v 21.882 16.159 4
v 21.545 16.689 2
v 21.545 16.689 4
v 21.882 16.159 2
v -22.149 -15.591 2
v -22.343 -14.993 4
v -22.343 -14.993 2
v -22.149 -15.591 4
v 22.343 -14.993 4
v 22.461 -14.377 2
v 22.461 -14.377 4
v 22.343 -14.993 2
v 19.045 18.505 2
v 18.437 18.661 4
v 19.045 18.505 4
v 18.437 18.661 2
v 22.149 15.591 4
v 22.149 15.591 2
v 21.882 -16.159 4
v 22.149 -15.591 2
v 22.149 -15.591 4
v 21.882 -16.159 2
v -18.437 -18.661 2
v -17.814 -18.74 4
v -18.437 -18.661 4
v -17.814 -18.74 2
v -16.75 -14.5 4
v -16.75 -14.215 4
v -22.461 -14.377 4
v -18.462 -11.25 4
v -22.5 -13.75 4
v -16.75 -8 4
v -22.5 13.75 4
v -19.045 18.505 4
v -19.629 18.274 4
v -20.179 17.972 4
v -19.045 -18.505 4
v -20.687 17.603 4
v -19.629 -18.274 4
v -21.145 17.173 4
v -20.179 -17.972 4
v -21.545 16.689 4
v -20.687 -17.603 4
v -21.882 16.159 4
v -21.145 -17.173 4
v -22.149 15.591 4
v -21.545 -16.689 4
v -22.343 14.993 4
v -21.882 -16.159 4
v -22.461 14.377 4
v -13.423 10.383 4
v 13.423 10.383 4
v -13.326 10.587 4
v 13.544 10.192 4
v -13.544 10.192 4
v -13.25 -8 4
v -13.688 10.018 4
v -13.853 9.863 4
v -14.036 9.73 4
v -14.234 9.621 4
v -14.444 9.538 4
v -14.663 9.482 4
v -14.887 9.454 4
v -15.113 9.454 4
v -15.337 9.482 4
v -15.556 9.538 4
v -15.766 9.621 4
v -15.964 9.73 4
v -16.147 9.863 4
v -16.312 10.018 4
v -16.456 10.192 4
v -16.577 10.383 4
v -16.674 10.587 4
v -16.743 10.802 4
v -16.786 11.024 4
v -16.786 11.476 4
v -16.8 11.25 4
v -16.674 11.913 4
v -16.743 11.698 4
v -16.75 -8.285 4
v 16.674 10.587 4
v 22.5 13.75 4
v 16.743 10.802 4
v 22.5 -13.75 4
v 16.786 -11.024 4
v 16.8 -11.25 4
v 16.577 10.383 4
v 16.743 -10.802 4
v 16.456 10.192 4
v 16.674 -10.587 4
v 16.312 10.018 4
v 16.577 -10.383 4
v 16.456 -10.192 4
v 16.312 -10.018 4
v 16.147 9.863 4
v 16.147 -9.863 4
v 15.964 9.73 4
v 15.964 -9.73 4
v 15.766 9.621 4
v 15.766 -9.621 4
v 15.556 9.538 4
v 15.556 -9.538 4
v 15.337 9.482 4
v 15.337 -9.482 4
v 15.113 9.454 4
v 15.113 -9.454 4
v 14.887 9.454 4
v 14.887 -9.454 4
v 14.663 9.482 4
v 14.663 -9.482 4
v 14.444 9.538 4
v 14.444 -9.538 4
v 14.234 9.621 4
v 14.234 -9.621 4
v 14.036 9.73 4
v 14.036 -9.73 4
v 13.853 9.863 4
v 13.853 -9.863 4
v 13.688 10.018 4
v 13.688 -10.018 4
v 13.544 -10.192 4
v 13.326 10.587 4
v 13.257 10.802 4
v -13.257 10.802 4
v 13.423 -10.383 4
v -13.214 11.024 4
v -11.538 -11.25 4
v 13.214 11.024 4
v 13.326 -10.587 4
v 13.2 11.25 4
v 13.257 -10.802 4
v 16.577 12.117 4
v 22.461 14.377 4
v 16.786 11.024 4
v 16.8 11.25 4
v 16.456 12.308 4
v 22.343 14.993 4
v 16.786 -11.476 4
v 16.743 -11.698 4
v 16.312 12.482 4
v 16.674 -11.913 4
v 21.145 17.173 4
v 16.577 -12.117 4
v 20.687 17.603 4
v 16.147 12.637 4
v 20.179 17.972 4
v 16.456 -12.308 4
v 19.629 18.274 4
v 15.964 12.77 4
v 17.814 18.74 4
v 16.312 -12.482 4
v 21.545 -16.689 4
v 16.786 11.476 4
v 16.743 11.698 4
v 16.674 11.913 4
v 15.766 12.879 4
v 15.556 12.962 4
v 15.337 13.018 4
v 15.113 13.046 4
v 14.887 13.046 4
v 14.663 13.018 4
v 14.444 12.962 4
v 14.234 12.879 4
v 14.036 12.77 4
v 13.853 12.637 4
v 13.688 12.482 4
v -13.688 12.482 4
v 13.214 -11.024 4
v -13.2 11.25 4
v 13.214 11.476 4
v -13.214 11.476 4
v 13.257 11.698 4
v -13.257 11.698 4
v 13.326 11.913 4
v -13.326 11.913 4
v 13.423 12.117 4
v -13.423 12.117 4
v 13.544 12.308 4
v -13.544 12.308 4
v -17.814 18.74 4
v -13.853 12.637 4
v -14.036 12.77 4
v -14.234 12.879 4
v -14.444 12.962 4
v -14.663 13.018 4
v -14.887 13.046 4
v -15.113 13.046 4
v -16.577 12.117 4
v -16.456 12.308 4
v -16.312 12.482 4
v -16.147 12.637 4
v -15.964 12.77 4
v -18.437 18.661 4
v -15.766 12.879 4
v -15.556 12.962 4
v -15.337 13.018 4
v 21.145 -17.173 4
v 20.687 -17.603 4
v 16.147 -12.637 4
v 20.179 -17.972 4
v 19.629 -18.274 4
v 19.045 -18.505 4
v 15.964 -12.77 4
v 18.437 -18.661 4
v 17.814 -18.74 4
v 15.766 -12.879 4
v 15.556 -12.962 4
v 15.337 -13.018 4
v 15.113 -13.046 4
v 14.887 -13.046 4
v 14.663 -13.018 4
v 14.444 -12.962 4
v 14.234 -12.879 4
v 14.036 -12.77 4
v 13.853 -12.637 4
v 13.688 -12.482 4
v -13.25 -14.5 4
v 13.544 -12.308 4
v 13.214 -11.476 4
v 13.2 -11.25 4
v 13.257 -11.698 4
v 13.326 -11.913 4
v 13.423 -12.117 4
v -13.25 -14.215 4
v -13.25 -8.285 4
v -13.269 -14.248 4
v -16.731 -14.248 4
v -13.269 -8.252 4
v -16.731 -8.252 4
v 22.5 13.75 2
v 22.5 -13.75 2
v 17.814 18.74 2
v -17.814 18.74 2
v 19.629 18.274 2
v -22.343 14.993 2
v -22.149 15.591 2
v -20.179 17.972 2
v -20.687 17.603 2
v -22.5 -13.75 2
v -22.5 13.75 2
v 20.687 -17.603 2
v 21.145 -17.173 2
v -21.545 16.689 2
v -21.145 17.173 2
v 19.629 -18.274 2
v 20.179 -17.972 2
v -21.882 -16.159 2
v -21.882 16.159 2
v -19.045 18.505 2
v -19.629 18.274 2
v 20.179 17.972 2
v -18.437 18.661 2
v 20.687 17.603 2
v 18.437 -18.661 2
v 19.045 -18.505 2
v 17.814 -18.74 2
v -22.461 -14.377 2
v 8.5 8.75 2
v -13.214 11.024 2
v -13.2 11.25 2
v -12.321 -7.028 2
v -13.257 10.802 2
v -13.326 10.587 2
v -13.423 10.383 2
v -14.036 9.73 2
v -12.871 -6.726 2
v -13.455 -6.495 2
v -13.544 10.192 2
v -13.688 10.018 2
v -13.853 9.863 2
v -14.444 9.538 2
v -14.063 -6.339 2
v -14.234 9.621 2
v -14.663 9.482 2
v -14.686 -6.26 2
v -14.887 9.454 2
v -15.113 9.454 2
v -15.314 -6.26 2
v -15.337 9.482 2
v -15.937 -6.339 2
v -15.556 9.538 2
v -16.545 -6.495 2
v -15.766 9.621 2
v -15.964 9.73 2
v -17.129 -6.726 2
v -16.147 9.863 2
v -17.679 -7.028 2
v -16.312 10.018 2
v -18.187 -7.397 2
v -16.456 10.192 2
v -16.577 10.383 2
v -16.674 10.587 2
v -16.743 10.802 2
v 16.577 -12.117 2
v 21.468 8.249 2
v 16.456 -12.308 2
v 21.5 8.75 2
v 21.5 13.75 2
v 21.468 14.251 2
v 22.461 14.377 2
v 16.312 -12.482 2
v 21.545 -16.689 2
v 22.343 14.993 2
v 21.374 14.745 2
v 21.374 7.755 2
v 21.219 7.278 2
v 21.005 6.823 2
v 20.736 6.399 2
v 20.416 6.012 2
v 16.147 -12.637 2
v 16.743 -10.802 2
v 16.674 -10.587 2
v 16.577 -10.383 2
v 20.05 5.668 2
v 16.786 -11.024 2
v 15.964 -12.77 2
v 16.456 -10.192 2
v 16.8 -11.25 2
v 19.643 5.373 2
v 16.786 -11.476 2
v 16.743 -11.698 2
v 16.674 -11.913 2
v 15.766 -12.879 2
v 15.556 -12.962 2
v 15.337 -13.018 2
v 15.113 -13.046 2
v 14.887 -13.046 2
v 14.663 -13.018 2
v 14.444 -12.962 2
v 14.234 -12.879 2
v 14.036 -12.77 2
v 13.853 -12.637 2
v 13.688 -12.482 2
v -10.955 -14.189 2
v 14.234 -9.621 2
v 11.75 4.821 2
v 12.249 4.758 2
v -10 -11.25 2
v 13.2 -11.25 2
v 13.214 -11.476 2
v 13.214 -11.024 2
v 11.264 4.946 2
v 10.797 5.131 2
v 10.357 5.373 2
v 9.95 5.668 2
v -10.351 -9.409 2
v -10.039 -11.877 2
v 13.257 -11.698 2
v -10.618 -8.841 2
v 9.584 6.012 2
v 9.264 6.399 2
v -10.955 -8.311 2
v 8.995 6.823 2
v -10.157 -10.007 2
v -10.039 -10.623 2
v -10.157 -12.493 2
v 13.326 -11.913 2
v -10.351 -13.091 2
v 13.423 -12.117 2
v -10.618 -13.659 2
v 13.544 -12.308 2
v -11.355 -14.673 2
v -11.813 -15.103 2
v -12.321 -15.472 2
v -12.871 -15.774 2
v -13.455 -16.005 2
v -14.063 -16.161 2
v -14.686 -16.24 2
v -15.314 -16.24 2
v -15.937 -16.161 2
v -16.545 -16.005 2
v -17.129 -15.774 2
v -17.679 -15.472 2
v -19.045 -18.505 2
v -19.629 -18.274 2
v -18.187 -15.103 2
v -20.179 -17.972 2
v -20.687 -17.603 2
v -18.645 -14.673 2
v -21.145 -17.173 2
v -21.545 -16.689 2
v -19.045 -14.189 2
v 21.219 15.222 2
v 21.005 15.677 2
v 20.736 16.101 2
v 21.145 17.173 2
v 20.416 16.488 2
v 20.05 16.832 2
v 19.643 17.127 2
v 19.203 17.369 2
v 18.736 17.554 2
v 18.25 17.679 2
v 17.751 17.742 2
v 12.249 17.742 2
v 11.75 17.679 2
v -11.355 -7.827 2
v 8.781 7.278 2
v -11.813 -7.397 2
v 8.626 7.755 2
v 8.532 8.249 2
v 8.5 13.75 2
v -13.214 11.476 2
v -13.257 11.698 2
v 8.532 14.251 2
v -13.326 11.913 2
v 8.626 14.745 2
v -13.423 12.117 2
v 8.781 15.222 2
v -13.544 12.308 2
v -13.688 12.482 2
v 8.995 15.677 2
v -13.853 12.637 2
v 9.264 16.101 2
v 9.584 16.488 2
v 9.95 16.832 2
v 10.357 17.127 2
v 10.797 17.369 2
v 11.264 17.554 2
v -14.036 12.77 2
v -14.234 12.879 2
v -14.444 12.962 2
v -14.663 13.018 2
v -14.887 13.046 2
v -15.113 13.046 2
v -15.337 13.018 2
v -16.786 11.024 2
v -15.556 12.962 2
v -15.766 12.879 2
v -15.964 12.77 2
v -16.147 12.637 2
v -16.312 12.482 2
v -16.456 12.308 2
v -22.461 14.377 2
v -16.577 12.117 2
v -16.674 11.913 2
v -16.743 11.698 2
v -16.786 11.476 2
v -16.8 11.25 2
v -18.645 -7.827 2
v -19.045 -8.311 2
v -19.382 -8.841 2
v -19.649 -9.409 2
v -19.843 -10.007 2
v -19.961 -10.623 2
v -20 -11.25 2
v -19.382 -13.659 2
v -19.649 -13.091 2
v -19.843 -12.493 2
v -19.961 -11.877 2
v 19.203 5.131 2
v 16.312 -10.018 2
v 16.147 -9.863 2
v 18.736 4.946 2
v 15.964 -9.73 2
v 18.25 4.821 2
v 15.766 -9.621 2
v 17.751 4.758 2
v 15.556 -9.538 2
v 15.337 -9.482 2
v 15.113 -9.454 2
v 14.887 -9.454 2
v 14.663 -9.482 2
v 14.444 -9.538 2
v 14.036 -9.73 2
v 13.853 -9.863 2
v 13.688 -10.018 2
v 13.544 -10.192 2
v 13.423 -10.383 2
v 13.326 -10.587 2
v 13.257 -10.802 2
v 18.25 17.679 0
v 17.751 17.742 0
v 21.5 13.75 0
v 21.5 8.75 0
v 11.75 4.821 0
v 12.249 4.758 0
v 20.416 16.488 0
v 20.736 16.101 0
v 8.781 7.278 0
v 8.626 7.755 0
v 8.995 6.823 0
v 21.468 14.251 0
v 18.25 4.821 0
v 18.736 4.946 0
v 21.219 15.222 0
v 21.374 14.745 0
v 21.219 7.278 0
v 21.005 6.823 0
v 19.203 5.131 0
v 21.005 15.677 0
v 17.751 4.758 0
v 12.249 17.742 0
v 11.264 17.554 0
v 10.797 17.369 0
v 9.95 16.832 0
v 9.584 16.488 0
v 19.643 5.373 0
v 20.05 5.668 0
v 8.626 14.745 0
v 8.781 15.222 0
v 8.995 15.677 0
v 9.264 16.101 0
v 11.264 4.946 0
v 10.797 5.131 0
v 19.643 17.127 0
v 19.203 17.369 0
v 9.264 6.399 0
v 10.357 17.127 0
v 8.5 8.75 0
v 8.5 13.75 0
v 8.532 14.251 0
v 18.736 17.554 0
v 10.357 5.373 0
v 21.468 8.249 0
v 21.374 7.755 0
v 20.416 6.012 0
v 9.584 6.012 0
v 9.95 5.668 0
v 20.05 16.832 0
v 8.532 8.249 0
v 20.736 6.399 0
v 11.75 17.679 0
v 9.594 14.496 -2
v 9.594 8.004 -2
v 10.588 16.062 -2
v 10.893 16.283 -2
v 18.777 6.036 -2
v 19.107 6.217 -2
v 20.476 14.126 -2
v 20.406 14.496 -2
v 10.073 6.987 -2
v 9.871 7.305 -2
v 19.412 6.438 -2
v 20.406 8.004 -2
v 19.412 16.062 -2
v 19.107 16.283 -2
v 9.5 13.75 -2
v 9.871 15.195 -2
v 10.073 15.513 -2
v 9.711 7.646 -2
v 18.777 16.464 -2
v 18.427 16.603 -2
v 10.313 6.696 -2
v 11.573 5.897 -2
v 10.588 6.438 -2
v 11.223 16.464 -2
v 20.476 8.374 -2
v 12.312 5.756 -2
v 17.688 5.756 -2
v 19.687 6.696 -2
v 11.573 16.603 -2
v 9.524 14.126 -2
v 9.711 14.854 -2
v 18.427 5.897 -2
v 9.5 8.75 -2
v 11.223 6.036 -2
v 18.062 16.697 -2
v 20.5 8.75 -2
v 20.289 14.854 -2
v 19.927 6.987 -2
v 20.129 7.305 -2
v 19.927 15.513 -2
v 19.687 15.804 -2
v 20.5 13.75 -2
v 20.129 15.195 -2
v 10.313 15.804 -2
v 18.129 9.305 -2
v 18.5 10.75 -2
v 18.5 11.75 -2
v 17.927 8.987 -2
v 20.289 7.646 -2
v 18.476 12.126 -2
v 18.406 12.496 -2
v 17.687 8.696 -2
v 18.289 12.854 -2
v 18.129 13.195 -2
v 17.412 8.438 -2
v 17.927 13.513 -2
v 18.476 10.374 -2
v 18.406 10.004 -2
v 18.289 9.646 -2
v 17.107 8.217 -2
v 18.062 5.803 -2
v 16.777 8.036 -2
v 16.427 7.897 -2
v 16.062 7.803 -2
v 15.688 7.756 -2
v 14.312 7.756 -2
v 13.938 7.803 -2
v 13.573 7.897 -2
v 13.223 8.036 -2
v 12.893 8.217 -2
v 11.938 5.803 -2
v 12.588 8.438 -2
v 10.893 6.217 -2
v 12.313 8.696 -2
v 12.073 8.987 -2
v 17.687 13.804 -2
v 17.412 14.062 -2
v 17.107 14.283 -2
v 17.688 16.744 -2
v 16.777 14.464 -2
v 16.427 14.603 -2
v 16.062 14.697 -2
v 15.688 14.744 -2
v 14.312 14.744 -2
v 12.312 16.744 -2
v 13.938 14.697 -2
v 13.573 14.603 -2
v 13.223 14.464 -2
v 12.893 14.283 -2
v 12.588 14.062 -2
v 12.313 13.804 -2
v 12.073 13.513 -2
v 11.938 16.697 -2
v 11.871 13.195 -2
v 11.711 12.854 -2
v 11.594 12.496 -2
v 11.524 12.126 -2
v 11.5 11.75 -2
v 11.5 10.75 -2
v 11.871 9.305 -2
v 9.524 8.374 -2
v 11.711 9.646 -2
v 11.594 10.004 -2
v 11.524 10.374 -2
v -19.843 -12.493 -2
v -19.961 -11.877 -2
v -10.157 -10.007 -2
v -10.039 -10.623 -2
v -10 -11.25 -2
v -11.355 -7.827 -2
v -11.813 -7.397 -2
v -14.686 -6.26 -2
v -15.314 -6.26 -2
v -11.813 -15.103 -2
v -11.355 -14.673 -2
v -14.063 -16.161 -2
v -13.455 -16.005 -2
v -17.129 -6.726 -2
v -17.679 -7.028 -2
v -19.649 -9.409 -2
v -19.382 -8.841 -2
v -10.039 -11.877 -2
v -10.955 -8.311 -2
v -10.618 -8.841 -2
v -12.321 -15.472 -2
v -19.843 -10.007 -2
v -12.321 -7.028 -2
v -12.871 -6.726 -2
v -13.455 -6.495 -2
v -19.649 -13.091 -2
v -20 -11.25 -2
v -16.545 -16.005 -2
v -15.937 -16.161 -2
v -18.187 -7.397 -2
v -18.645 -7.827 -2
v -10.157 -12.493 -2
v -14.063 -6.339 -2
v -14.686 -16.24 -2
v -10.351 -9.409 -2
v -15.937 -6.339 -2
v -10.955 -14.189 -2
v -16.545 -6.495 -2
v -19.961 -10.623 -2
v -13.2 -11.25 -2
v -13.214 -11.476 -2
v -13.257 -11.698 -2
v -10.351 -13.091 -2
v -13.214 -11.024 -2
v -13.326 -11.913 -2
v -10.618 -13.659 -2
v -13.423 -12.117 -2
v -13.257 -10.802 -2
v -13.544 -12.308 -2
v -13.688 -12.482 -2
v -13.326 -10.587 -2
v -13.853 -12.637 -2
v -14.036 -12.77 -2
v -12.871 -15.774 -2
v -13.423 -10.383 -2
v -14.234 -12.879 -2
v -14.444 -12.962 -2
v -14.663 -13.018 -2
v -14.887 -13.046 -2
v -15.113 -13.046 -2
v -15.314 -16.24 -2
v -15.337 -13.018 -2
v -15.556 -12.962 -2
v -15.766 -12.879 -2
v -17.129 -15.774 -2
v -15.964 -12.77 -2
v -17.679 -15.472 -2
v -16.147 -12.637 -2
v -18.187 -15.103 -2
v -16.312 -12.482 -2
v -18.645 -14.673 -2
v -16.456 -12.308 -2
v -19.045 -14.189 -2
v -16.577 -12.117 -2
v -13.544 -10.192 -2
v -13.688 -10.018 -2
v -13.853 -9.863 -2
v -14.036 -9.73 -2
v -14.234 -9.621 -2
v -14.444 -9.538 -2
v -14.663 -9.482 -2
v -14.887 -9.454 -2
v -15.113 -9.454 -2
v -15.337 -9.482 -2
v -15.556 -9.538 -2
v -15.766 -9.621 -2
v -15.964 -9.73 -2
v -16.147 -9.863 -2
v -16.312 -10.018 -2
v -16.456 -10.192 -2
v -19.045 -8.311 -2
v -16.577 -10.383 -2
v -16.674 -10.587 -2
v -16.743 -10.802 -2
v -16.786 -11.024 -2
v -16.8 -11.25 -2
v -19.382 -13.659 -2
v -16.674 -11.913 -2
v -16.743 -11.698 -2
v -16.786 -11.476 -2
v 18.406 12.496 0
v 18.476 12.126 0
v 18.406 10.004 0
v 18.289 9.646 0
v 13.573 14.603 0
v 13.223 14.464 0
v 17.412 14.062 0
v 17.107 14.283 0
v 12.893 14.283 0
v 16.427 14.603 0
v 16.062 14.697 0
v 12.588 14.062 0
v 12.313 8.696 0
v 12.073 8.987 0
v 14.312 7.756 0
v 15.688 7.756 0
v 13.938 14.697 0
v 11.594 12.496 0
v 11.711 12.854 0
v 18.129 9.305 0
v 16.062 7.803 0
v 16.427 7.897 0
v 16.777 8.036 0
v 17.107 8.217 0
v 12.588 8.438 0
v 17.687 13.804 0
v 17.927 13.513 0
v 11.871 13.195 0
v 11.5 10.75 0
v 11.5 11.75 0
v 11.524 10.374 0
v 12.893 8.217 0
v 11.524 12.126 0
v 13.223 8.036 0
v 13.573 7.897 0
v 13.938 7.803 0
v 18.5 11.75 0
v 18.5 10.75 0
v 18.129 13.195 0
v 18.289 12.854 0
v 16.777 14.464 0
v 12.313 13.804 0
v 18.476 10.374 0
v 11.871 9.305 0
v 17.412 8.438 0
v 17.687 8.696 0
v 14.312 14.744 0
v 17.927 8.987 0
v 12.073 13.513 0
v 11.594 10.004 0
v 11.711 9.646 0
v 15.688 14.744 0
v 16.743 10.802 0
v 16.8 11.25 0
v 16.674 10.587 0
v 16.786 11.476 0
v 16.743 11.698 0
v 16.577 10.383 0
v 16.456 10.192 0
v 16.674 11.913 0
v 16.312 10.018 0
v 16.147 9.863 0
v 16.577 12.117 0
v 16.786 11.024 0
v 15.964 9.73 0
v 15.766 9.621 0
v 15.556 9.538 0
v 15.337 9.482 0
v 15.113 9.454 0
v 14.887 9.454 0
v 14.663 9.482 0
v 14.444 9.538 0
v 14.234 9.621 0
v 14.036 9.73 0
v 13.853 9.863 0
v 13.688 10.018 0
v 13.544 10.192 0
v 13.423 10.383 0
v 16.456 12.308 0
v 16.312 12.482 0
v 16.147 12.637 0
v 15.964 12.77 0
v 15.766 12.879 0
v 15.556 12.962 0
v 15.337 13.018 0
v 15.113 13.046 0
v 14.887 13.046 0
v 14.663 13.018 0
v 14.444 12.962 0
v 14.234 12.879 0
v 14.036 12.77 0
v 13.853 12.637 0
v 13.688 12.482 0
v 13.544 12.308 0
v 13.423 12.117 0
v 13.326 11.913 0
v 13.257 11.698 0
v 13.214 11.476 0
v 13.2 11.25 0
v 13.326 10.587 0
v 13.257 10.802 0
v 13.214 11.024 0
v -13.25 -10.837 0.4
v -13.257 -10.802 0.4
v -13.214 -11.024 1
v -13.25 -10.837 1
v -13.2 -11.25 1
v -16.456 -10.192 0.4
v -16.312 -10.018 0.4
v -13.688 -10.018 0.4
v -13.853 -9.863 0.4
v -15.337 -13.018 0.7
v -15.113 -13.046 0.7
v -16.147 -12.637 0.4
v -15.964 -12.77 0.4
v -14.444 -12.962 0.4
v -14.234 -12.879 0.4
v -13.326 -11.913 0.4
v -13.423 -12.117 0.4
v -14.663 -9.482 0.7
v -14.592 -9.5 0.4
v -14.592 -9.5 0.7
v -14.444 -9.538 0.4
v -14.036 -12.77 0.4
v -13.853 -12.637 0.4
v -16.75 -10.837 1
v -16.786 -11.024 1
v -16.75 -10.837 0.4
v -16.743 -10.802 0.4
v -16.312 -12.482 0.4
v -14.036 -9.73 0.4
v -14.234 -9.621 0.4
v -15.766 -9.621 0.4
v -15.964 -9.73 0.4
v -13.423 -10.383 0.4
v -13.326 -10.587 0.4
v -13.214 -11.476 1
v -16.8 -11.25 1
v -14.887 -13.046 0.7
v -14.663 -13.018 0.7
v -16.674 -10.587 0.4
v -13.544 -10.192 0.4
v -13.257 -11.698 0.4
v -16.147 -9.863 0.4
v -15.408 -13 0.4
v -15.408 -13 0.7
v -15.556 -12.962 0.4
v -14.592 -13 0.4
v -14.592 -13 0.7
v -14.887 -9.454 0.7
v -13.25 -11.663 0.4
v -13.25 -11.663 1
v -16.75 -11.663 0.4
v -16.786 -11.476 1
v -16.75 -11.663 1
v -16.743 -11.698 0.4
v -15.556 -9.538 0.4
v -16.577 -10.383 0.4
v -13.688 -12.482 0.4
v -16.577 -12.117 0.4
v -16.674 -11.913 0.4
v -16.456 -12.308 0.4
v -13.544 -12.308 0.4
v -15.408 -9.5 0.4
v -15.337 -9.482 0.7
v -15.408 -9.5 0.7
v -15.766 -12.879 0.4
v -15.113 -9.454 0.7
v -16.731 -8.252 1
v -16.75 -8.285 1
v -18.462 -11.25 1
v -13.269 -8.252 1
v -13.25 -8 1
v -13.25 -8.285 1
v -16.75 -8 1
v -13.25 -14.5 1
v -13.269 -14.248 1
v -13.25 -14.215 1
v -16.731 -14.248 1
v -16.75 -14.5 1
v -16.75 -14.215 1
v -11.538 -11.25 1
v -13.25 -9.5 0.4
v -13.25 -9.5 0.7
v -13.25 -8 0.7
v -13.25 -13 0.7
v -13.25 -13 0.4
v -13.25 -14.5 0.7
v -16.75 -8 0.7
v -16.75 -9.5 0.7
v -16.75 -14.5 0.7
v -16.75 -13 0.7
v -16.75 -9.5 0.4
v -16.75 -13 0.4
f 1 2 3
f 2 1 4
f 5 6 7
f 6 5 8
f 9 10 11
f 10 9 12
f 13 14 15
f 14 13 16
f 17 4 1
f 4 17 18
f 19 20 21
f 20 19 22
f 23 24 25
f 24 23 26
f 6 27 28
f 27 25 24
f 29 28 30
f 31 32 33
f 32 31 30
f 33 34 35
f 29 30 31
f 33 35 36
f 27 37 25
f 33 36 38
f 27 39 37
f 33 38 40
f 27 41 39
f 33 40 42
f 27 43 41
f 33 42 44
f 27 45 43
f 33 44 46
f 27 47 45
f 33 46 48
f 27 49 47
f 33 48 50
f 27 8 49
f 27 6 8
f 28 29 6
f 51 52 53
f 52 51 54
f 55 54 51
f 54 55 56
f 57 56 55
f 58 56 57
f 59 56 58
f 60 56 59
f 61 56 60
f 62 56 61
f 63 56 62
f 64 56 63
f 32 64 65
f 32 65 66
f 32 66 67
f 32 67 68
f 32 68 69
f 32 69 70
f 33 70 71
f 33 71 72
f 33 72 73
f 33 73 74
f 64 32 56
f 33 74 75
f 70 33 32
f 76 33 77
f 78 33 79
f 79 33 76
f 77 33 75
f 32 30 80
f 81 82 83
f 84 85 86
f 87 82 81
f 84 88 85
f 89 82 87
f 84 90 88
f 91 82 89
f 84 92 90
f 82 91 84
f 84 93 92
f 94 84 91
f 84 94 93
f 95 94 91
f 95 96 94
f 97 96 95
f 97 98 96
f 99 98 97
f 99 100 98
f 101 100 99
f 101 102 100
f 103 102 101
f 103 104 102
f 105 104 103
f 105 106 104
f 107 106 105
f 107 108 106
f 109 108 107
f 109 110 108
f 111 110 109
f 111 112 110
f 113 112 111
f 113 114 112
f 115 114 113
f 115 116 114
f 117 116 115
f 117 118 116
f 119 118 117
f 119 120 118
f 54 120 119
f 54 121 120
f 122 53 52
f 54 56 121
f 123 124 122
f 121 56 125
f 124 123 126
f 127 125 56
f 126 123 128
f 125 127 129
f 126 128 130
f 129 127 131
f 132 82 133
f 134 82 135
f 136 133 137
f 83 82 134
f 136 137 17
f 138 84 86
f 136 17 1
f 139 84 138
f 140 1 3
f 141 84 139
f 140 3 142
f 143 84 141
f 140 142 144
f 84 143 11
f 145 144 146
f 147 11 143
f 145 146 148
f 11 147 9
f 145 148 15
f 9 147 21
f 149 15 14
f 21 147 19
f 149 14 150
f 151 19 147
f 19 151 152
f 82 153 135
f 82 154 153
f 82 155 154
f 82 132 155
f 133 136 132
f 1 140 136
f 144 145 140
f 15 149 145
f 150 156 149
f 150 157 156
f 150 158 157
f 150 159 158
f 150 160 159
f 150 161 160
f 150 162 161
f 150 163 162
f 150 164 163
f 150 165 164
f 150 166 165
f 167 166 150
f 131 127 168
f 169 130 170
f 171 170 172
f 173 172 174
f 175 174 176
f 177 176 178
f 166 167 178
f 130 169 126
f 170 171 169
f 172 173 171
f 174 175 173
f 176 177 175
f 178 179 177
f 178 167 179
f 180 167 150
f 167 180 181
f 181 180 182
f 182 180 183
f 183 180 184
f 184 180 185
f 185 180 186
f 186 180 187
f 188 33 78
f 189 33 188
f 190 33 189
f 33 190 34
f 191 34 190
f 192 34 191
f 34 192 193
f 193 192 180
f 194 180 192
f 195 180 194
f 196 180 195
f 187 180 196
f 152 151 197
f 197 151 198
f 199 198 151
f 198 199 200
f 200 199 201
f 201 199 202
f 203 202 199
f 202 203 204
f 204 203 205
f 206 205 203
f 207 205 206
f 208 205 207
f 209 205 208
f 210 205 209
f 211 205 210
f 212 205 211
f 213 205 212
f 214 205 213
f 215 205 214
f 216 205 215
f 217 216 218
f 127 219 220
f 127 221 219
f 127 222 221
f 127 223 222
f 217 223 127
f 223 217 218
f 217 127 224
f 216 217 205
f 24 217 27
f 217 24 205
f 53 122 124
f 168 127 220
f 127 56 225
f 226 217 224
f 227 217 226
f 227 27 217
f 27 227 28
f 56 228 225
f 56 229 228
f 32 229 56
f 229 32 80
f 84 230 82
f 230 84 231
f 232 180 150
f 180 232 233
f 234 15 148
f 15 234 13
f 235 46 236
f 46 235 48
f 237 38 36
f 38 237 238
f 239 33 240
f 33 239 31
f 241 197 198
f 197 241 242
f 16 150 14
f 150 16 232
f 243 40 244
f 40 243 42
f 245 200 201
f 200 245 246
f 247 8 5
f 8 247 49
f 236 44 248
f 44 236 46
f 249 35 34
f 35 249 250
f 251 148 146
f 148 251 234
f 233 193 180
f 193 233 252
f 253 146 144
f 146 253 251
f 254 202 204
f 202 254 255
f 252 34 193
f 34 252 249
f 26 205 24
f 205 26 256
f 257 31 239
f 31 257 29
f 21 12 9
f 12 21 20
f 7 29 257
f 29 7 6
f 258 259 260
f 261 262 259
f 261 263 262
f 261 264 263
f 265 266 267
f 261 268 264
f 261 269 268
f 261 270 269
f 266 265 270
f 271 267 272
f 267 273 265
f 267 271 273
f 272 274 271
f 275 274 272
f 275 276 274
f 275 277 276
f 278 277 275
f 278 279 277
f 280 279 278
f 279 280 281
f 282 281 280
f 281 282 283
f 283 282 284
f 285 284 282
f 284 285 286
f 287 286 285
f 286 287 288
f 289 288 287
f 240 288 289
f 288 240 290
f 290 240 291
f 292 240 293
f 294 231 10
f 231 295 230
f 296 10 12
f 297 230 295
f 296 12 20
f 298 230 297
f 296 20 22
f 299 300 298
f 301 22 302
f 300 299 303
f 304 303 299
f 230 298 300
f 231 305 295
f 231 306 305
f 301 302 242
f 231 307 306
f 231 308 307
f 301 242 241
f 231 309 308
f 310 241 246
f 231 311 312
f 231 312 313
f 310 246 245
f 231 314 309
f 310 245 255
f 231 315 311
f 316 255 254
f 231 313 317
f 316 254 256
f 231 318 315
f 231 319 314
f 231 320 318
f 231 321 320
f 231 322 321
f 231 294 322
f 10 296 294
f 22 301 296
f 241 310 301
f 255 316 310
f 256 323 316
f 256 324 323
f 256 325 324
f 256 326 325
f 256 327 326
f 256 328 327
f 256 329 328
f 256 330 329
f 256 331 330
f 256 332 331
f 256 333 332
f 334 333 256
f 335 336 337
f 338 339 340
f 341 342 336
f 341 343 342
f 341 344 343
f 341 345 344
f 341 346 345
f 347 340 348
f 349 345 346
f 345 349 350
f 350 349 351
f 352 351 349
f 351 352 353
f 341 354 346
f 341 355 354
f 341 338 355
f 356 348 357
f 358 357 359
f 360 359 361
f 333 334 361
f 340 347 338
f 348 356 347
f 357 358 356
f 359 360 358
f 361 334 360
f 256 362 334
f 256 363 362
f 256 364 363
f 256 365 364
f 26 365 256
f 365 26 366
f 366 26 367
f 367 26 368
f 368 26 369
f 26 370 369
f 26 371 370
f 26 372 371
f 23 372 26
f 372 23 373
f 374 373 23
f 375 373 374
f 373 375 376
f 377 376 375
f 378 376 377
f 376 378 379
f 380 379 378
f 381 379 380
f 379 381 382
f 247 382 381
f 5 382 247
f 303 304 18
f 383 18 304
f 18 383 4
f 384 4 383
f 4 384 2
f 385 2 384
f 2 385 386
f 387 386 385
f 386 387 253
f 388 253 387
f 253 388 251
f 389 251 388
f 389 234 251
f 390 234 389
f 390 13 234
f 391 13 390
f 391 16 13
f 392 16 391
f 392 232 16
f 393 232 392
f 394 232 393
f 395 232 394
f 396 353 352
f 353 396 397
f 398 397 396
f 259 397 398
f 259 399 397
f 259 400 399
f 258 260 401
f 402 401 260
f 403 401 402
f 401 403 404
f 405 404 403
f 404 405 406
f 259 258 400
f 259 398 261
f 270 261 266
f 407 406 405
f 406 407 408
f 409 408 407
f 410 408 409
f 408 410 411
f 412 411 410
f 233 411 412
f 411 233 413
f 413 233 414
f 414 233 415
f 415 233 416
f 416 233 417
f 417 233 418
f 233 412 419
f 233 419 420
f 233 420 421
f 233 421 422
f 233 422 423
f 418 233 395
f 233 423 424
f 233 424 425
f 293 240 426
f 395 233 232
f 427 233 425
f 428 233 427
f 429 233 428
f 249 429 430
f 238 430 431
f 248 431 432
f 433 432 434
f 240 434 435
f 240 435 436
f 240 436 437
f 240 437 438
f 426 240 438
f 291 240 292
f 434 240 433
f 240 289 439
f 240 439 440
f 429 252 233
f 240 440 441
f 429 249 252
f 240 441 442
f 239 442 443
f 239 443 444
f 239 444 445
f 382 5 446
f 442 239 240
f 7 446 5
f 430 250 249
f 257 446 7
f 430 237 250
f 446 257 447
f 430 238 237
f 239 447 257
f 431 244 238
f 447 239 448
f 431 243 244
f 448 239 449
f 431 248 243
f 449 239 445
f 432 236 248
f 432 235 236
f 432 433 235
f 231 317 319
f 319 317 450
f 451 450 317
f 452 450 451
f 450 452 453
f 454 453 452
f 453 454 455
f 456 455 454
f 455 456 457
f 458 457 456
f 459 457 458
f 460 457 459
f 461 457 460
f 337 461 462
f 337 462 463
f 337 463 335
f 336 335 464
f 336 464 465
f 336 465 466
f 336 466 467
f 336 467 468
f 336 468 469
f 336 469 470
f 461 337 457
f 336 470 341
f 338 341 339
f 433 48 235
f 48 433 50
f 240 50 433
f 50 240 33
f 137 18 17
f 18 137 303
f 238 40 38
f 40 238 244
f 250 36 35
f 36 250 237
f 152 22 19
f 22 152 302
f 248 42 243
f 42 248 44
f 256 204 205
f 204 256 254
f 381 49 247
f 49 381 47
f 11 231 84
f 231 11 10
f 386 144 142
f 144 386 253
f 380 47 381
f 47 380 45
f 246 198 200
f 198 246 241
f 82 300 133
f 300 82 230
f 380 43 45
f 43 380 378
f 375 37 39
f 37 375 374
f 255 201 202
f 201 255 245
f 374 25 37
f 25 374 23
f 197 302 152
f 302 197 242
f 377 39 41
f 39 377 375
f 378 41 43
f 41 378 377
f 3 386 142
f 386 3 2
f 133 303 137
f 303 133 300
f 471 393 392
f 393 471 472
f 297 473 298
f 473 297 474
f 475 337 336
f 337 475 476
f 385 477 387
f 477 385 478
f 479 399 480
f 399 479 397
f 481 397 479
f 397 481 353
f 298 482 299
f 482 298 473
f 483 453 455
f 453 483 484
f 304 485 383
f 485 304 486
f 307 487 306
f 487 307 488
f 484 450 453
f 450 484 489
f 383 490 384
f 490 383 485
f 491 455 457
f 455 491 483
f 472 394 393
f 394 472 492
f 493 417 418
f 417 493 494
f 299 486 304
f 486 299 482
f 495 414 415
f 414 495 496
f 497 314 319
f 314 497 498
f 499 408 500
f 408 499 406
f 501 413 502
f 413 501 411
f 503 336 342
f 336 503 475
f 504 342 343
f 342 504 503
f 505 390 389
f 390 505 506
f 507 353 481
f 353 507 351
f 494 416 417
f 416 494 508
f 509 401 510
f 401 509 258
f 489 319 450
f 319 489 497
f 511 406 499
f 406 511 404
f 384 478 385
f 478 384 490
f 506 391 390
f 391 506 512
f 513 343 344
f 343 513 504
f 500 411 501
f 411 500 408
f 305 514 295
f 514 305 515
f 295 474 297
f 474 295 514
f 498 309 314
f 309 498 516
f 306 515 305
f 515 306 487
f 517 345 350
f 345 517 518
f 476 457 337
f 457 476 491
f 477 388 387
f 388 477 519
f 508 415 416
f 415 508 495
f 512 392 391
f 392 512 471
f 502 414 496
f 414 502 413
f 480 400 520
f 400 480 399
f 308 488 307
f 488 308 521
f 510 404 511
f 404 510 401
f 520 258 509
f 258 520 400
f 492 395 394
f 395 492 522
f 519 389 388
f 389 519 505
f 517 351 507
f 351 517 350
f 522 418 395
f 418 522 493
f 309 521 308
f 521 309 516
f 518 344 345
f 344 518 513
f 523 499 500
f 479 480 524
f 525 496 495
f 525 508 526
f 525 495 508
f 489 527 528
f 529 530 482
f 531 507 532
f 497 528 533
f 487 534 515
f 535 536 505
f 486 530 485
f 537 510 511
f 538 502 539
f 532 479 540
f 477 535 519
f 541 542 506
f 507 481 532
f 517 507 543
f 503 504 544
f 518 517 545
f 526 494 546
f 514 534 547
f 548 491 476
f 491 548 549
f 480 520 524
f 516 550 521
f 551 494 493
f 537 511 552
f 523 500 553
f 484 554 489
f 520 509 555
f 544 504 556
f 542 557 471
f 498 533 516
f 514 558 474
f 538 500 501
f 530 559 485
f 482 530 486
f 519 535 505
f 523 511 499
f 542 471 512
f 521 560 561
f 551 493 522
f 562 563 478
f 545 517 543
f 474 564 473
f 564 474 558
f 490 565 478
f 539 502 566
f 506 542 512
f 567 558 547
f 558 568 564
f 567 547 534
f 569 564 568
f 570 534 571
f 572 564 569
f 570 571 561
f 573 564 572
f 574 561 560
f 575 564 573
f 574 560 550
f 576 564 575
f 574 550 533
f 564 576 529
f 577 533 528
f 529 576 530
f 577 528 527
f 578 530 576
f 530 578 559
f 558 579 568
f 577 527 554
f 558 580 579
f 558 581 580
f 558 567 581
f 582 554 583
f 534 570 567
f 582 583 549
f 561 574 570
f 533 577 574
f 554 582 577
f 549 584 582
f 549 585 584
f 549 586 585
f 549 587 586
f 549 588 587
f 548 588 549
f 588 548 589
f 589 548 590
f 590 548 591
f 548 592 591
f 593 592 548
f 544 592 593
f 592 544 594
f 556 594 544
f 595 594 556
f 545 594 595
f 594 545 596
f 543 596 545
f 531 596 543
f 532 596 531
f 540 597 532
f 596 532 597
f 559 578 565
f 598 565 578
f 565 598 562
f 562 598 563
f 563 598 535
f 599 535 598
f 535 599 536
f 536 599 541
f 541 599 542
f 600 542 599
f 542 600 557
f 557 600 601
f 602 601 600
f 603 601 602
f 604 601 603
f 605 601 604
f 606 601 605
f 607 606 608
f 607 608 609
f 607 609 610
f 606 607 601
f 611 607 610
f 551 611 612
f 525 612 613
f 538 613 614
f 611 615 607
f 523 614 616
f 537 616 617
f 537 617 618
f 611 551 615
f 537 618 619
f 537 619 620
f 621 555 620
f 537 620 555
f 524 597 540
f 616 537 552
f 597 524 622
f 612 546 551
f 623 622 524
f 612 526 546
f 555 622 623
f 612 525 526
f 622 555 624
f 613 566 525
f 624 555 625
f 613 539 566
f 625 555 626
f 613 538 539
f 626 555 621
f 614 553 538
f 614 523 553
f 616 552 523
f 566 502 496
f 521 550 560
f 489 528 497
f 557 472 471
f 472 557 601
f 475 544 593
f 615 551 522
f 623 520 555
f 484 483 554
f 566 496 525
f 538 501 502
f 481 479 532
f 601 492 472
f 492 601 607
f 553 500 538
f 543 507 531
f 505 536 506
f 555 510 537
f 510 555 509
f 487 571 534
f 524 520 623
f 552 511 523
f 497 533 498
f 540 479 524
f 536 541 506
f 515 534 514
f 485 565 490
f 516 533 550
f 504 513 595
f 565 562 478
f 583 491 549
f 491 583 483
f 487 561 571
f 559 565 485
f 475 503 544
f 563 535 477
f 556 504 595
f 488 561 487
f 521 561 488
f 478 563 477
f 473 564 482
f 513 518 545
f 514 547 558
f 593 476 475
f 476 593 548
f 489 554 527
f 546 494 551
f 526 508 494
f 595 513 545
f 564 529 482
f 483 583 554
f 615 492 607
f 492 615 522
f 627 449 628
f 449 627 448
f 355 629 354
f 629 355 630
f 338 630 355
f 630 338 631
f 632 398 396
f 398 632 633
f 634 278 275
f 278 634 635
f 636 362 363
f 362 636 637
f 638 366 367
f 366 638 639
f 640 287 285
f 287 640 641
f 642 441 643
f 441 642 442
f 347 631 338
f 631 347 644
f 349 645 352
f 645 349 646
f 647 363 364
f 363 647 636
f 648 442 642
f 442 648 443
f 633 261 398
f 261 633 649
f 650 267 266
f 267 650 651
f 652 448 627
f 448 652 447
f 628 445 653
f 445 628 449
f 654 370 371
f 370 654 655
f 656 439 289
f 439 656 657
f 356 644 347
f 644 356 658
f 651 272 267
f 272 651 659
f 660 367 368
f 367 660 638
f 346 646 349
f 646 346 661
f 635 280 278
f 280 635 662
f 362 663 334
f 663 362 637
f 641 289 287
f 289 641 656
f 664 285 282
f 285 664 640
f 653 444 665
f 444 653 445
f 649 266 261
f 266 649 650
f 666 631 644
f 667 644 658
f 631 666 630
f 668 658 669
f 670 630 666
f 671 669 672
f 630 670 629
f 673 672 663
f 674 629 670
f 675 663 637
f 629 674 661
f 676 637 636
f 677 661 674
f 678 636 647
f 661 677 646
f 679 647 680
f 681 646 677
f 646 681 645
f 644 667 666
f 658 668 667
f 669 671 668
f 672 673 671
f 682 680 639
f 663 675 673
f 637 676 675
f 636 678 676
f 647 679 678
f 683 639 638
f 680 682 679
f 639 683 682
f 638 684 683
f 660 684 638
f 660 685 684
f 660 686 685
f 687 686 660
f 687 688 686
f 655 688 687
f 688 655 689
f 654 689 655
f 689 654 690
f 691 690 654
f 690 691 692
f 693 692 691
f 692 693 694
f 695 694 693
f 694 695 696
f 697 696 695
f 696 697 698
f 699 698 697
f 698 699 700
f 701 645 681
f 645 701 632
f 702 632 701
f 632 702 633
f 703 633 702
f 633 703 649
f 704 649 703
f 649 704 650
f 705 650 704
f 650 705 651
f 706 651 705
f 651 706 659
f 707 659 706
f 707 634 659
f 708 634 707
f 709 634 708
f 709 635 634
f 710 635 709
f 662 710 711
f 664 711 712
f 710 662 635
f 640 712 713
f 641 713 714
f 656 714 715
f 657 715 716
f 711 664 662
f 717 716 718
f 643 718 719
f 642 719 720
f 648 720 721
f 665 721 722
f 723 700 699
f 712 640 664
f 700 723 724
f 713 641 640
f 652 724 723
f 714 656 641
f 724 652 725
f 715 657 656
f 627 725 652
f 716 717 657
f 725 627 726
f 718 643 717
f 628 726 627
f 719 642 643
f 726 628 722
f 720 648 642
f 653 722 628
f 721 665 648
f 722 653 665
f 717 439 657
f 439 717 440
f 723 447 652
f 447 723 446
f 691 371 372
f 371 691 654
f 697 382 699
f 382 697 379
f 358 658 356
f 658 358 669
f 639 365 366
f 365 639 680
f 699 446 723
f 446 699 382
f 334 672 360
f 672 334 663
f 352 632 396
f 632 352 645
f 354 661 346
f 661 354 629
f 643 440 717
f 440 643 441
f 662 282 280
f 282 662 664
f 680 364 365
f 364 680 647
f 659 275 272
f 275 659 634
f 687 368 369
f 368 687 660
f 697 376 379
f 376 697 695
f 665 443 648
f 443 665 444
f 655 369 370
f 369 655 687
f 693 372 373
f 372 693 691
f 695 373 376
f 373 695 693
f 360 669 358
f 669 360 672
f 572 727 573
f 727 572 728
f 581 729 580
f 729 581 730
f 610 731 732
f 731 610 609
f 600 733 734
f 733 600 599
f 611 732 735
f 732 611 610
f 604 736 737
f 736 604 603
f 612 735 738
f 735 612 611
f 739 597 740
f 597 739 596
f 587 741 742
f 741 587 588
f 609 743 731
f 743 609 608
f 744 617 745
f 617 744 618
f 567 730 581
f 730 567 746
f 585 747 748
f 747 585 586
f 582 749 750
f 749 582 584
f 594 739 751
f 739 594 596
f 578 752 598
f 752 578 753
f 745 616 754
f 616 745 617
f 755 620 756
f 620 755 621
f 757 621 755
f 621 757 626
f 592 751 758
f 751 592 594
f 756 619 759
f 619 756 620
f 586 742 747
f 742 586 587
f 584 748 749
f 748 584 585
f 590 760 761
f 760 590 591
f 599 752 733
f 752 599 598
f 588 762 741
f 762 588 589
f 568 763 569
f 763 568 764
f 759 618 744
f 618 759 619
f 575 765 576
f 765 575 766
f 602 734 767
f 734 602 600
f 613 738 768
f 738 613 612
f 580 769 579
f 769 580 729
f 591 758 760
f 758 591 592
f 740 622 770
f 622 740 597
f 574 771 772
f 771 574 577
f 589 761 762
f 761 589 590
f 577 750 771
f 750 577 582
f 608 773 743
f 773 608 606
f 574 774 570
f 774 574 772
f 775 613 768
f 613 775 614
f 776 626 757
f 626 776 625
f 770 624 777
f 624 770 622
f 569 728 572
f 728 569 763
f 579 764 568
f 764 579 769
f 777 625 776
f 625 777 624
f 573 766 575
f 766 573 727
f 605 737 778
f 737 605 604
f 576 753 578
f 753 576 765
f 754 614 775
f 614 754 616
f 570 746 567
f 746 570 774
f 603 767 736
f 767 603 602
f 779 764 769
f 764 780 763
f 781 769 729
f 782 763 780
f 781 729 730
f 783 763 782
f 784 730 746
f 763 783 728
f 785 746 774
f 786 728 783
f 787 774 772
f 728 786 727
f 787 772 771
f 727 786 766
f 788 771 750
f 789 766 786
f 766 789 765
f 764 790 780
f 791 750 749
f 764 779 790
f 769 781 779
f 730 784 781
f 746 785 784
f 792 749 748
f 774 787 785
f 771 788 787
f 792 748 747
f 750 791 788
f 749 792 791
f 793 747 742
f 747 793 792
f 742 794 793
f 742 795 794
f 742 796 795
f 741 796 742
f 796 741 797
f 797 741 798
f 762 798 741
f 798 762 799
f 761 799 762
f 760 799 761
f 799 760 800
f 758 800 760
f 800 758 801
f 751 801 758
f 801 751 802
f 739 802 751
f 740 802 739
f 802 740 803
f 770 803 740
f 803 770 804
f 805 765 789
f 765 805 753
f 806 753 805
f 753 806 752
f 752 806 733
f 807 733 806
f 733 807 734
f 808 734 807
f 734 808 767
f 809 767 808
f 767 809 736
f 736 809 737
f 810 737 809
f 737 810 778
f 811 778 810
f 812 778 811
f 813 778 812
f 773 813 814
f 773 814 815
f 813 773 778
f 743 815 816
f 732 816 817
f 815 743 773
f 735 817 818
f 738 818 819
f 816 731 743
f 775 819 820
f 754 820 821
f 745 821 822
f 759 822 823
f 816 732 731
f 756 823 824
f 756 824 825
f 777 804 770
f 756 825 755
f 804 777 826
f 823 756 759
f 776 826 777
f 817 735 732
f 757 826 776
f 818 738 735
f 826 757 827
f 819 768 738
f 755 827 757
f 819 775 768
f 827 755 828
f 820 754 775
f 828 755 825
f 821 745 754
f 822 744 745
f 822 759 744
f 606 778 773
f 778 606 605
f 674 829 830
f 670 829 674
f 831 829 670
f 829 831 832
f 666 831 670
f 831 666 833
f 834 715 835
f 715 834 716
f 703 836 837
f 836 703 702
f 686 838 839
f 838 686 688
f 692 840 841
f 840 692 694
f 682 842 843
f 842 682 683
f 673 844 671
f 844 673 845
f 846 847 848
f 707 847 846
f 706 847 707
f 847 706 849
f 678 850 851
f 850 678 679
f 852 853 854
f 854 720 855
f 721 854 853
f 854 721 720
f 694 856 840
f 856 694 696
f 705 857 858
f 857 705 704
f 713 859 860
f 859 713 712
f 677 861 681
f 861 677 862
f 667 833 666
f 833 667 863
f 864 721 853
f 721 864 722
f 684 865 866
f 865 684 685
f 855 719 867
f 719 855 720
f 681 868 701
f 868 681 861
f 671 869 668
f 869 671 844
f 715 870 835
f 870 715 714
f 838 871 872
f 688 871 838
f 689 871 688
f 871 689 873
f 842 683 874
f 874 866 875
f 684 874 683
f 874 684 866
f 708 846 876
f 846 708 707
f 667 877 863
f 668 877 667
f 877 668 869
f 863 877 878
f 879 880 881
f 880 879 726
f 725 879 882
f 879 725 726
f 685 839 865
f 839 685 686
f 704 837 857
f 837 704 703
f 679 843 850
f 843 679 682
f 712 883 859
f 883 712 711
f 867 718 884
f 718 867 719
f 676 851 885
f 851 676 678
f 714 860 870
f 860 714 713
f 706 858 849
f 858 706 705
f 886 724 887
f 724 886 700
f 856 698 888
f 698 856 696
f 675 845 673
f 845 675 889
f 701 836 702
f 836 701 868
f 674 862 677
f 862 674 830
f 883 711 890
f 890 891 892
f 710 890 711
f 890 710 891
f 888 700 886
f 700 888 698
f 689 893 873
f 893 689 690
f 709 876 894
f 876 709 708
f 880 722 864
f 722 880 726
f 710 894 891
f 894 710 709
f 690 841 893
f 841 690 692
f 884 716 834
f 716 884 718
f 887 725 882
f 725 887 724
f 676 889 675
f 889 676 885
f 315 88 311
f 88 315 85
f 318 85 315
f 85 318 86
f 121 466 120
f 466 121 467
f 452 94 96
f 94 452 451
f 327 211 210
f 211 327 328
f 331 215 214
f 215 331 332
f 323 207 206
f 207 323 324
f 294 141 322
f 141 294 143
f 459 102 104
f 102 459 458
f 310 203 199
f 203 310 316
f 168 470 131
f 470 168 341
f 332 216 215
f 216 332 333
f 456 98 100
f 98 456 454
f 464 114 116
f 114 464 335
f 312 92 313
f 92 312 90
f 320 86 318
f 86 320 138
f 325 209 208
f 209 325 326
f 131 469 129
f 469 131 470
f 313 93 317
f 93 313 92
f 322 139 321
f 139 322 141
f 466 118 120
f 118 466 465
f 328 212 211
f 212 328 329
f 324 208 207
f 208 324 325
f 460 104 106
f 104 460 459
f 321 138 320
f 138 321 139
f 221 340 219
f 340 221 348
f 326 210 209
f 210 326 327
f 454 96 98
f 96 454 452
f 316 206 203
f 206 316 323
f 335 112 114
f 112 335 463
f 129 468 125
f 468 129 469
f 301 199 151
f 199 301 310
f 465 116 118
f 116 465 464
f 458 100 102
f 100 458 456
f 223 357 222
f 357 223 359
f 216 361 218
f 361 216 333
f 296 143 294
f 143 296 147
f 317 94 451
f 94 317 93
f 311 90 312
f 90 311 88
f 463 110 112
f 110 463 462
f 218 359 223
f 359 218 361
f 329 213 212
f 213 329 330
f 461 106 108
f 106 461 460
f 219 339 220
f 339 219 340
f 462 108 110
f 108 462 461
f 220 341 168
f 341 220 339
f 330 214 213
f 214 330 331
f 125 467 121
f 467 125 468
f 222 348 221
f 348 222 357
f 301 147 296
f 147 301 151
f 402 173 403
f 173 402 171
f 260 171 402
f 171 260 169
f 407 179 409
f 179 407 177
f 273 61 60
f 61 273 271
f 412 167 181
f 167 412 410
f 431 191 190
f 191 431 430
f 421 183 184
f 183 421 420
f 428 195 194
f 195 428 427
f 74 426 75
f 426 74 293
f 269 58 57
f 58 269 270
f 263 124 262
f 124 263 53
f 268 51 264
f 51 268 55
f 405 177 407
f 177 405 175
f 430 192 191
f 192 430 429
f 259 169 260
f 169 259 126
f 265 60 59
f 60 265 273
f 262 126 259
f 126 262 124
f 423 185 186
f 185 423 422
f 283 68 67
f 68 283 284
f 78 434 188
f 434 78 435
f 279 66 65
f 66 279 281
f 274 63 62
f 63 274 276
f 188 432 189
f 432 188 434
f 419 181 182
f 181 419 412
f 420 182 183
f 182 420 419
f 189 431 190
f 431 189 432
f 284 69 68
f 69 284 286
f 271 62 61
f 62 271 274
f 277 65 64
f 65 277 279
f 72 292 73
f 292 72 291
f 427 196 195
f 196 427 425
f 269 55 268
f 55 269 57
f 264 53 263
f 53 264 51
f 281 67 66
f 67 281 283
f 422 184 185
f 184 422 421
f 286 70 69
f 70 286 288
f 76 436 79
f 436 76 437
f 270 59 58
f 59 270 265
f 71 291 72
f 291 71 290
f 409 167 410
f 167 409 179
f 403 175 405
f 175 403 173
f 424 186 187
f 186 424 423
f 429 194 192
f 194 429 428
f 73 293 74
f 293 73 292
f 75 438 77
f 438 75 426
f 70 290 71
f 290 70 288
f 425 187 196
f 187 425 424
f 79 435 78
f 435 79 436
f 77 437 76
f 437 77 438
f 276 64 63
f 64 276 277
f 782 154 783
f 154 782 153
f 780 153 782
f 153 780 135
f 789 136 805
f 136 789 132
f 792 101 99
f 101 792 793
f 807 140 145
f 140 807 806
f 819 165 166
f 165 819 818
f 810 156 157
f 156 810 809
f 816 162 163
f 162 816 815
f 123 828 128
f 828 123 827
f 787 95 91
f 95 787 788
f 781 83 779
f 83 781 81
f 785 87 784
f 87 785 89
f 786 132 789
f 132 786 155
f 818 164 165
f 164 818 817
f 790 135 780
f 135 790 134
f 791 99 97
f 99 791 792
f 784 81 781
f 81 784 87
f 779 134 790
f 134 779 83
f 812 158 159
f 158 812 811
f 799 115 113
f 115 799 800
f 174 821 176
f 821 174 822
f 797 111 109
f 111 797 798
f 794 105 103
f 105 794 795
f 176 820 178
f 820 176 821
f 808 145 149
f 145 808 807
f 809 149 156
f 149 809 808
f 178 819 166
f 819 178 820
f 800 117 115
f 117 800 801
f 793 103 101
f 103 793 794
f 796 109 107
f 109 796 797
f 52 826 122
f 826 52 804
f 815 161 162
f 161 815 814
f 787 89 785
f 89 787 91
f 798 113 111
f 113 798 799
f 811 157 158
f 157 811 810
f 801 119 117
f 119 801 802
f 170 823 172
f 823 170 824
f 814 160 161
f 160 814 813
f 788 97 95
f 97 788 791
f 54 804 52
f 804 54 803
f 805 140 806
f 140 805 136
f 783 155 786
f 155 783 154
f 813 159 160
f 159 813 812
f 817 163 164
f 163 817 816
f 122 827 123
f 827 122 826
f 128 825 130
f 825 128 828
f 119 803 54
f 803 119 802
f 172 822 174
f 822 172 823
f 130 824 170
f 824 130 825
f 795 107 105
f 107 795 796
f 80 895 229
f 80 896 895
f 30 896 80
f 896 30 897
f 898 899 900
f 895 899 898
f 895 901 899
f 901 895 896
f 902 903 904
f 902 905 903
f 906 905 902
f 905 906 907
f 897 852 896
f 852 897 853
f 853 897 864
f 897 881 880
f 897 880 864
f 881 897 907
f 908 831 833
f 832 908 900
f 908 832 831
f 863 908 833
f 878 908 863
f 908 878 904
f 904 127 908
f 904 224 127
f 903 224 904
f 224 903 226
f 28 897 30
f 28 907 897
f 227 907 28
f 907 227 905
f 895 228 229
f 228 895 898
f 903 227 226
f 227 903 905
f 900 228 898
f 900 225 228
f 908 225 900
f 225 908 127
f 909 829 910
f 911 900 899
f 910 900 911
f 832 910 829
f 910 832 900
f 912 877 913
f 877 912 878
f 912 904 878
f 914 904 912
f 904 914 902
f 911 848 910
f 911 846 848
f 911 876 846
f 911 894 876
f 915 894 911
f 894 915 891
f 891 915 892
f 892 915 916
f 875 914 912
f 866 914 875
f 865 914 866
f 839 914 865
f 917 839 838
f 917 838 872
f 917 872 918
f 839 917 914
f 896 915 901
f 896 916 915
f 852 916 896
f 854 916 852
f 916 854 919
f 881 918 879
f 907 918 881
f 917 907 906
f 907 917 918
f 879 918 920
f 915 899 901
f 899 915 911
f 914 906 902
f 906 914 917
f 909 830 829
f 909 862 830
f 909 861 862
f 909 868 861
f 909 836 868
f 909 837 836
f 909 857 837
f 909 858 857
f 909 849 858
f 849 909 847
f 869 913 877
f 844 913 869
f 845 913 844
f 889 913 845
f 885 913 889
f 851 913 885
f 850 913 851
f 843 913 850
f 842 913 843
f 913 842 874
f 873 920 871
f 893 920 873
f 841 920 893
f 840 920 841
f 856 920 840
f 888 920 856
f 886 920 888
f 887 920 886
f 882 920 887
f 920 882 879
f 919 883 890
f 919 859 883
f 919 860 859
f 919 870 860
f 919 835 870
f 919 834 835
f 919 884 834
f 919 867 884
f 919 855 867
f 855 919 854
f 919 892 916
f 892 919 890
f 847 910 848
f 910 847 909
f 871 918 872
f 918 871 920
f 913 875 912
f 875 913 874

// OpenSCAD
$fn = 50;


difference() {
	union() {
		translate(v = [0, 0, 2]) {
			rotate(a = [0, 0, 0]) {
				hull() {
					translate(v = [-17.5000000000, 13.7500000000, 0]) {
						rotate(a = [0, 0, 0]) {
							translate(v = [0, 0, 0]) {
								rotate(a = [0, 0, 0]) {
									cylinder(h = 2, r = 5);
								}
							}
						}
					}
					translate(v = [17.5000000000, 13.7500000000, 0]) {
						rotate(a = [0, 0, 0]) {
							translate(v = [0, 0, 0]) {
								rotate(a = [0, 0, 0]) {
									cylinder(h = 2, r = 5);
								}
							}
						}
					}
					translate(v = [-17.5000000000, -13.7500000000, 0]) {
						rotate(a = [0, 0, 0]) {
							translate(v = [0, 0, 0]) {
								rotate(a = [0, 0, 0]) {
									cylinder(h = 2, r = 5);
								}
							}
						}
					}
					translate(v = [17.5000000000, -13.7500000000, 0]) {
						rotate(a = [0, 0, 0]) {
							translate(v = [0, 0, 0]) {
								rotate(a = [0, 0, 0]) {
									cylinder(h = 2, r = 5);
								}
							}
						}
					}
				}
			}
		}
		translate(v = [15.0000000000, 11.2500000000, 0]) {
			rotate(a = [0, 0, 0]) {
				hull() {
					translate(v = [-2.5000000000, 2.5000000000, 0]) {
						rotate(a = [0, 0, 0]) {
							cylinder(h = 2, r1 = 4.0000000000, r2 = 4.0000000000);
						}
					}
					translate(v = [2.5000000000, 2.5000000000, 0]) {
						rotate(a = [0, 0, 0]) {
							cylinder(h = 2, r1 = 4.0000000000, r2 = 4.0000000000);
						}
					}
					translate(v = [-2.5000000000, -2.5000000000, 0]) {
						rotate(a = [0, 0, 0]) {
							cylinder(h = 2, r1 = 4.0000000000, r2 = 4.0000000000);
						}
					}
					translate(v = [2.5000000000, -2.5000000000, 0]) {
						rotate(a = [0, 0, 0]) {
							cylinder(h = 2, r1 = 4.0000000000, r2 = 4.0000000000);
						}
					}
				}
			}
		}
		translate(v = [15.0000000000, 11.2500000000, -2]) {
			rotate(a = [0, 180, 0]) {
				hull() {
					translate(v = [-2.5000000000, 2.5000000000, 0]) {
						rotate(a = [0, 180, 0]) {
							cylinder(h = 2, r1 = 3.0000000000, r2 = 4.0000000000);
						}
					}
					translate(v = [2.5000000000, 2.5000000000, 0]) {
						rotate(a = [0, 180, 0]) {
							cylinder(h = 2, r1 = 3.0000000000, r2 = 4.0000000000);
						}
					}
					translate(v = [-2.5000000000, -2.5000000000, 0]) {
						rotate(a = [0, 180, 0]) {
							cylinder(h = 2, r1 = 3.0000000000, r2 = 4.0000000000);
						}
					}
					translate(v = [2.5000000000, -2.5000000000, 0]) {
						rotate(a = [0, 180, 0]) {
							cylinder(h = 2, r1 = 3.0000000000, r2 = 4.0000000000);
						}
					}
				}
			}
		}
		translate(v = [-15.0000000000, -11.2500000000, -2.0000000000]) {
			rotate(a = [0, 0, 0]) {
				cylinder(h = 4, r = 5);
			}
		}
	}
	union() {
		translate(v = [15.0000000000, 11.2500000000, -2]) {
			rotate(a = [0, 0, 0]) {
				hull() {
					translate(v = [-0.5000000000, 0.5000000000, 0]) {
						rotate(a = [0, 0, 0]) {
							translate(v = [0, 0, 0]) {
								rotate(a = [0, 0, 0]) {
									cylinder(h = 2, r = 3.0000000000);
								}
							}
						}
					}
					translate(v = [0.5000000000, 0.5000000000, 0]) {
						rotate(a = [0, 0, 0]) {
							translate(v = [0, 0, 0]) {
								rotate(a = [0, 0, 0]) {
									cylinder(h = 2, r = 3.0000000000);
								}
							}
						}
					}
					translate(v = [-0.5000000000, -0.5000000000, 0]) {
						rotate(a = [0, 0, 0]) {
							translate(v = [0, 0, 0]) {
								rotate(a = [0, 0, 0]) {
									cylinder(h = 2, r = 3.0000000000);
								}
							}
						}
					}
					translate(v = [0.5000000000, -0.5000000000, 0]) {
						rotate(a = [0, 0, 0]) {
							translate(v = [0, 0, 0]) {
								rotate(a = [0, 0, 0]) {
									cylinder(h = 2, r = 3.0000000000);
								}
							}
						}
					}
				}
			}
		}
		translate(v = [-15.0000000000, -11.2500000000, -50]) {
			rotate(a = [0, 0, 0]) {
				cylinder(h = 100, r = 1.8000000000);
			}
		}
		translate(v = [15.0000000000, -11.2500000000, -50]) {
			rotate(a = [0, 0, 0]) {
				cylinder(h = 100, r = 1.8000000000);
			}
		}
		translate(v = [-15.0000000000, 11.2500000000, -50]) {
			rotate(a = [0, 0, 0]) {
				cylinder(h = 100, r = 1.8000000000);
			}
		}
		translate(v = [15.0000000000, 11.2500000000, -50]) {
			rotate(a = [0, 0, 0]) {
				cylinder(h = 100, r = 1.8000000000);
			}
		}
		translate(v = [-15.0000000000, -11.2500000000, 1]) {
			rotate(a = [0, 0, 0]) {
				#translate(v = [0, 0, 0]) {
					rotate(a = [0, 0, 0]) {
						linear_extrude(height = 3) {
							polygon(points = [[3.4620000000, 0.0000000000], [1.7310000000, 2.9981799479], [-1.7310000000, 2.9981799479], [-3.4620000000, 0.0000000000], [-1.7310000000, -2.9981799479], [1.7310000000, -2.9981799479]]);
						}
					}
				}
			}
		}
		#translate(v = [-16.7500000000, -14.5000000000, 4]) {
			rotate(a = [0, 0, 0]) {
				cube(size = [3.5000000000, 6.5000000000, 0.3000000000]);
			}
		}
		#translate(v = [-16.7500000000, -13.0000000000, 4.3000000000]) {
			rotate(a = [0, 0, 0]) {
				cube(size = [3.5000000000, 3.5000000000, 0.3000000000]);
			}
		}
		#translate(v = [-16.7500000000, -14.5000000000, 0.7000000000]) {
			rotate(a = [0, 0, 0]) {
				cube(size = [3.5000000000, 6.5000000000, 0.3000000000]);
			}
		}
		#translate(v = [-16.7500000000, -13.0000000000, 0.4000000000]) {
			rotate(a = [0, 0, 0]) {
				cube(size = [3.5000000000, 3.5000000000, 0.3000000000]);
			}
		}
	}
}
